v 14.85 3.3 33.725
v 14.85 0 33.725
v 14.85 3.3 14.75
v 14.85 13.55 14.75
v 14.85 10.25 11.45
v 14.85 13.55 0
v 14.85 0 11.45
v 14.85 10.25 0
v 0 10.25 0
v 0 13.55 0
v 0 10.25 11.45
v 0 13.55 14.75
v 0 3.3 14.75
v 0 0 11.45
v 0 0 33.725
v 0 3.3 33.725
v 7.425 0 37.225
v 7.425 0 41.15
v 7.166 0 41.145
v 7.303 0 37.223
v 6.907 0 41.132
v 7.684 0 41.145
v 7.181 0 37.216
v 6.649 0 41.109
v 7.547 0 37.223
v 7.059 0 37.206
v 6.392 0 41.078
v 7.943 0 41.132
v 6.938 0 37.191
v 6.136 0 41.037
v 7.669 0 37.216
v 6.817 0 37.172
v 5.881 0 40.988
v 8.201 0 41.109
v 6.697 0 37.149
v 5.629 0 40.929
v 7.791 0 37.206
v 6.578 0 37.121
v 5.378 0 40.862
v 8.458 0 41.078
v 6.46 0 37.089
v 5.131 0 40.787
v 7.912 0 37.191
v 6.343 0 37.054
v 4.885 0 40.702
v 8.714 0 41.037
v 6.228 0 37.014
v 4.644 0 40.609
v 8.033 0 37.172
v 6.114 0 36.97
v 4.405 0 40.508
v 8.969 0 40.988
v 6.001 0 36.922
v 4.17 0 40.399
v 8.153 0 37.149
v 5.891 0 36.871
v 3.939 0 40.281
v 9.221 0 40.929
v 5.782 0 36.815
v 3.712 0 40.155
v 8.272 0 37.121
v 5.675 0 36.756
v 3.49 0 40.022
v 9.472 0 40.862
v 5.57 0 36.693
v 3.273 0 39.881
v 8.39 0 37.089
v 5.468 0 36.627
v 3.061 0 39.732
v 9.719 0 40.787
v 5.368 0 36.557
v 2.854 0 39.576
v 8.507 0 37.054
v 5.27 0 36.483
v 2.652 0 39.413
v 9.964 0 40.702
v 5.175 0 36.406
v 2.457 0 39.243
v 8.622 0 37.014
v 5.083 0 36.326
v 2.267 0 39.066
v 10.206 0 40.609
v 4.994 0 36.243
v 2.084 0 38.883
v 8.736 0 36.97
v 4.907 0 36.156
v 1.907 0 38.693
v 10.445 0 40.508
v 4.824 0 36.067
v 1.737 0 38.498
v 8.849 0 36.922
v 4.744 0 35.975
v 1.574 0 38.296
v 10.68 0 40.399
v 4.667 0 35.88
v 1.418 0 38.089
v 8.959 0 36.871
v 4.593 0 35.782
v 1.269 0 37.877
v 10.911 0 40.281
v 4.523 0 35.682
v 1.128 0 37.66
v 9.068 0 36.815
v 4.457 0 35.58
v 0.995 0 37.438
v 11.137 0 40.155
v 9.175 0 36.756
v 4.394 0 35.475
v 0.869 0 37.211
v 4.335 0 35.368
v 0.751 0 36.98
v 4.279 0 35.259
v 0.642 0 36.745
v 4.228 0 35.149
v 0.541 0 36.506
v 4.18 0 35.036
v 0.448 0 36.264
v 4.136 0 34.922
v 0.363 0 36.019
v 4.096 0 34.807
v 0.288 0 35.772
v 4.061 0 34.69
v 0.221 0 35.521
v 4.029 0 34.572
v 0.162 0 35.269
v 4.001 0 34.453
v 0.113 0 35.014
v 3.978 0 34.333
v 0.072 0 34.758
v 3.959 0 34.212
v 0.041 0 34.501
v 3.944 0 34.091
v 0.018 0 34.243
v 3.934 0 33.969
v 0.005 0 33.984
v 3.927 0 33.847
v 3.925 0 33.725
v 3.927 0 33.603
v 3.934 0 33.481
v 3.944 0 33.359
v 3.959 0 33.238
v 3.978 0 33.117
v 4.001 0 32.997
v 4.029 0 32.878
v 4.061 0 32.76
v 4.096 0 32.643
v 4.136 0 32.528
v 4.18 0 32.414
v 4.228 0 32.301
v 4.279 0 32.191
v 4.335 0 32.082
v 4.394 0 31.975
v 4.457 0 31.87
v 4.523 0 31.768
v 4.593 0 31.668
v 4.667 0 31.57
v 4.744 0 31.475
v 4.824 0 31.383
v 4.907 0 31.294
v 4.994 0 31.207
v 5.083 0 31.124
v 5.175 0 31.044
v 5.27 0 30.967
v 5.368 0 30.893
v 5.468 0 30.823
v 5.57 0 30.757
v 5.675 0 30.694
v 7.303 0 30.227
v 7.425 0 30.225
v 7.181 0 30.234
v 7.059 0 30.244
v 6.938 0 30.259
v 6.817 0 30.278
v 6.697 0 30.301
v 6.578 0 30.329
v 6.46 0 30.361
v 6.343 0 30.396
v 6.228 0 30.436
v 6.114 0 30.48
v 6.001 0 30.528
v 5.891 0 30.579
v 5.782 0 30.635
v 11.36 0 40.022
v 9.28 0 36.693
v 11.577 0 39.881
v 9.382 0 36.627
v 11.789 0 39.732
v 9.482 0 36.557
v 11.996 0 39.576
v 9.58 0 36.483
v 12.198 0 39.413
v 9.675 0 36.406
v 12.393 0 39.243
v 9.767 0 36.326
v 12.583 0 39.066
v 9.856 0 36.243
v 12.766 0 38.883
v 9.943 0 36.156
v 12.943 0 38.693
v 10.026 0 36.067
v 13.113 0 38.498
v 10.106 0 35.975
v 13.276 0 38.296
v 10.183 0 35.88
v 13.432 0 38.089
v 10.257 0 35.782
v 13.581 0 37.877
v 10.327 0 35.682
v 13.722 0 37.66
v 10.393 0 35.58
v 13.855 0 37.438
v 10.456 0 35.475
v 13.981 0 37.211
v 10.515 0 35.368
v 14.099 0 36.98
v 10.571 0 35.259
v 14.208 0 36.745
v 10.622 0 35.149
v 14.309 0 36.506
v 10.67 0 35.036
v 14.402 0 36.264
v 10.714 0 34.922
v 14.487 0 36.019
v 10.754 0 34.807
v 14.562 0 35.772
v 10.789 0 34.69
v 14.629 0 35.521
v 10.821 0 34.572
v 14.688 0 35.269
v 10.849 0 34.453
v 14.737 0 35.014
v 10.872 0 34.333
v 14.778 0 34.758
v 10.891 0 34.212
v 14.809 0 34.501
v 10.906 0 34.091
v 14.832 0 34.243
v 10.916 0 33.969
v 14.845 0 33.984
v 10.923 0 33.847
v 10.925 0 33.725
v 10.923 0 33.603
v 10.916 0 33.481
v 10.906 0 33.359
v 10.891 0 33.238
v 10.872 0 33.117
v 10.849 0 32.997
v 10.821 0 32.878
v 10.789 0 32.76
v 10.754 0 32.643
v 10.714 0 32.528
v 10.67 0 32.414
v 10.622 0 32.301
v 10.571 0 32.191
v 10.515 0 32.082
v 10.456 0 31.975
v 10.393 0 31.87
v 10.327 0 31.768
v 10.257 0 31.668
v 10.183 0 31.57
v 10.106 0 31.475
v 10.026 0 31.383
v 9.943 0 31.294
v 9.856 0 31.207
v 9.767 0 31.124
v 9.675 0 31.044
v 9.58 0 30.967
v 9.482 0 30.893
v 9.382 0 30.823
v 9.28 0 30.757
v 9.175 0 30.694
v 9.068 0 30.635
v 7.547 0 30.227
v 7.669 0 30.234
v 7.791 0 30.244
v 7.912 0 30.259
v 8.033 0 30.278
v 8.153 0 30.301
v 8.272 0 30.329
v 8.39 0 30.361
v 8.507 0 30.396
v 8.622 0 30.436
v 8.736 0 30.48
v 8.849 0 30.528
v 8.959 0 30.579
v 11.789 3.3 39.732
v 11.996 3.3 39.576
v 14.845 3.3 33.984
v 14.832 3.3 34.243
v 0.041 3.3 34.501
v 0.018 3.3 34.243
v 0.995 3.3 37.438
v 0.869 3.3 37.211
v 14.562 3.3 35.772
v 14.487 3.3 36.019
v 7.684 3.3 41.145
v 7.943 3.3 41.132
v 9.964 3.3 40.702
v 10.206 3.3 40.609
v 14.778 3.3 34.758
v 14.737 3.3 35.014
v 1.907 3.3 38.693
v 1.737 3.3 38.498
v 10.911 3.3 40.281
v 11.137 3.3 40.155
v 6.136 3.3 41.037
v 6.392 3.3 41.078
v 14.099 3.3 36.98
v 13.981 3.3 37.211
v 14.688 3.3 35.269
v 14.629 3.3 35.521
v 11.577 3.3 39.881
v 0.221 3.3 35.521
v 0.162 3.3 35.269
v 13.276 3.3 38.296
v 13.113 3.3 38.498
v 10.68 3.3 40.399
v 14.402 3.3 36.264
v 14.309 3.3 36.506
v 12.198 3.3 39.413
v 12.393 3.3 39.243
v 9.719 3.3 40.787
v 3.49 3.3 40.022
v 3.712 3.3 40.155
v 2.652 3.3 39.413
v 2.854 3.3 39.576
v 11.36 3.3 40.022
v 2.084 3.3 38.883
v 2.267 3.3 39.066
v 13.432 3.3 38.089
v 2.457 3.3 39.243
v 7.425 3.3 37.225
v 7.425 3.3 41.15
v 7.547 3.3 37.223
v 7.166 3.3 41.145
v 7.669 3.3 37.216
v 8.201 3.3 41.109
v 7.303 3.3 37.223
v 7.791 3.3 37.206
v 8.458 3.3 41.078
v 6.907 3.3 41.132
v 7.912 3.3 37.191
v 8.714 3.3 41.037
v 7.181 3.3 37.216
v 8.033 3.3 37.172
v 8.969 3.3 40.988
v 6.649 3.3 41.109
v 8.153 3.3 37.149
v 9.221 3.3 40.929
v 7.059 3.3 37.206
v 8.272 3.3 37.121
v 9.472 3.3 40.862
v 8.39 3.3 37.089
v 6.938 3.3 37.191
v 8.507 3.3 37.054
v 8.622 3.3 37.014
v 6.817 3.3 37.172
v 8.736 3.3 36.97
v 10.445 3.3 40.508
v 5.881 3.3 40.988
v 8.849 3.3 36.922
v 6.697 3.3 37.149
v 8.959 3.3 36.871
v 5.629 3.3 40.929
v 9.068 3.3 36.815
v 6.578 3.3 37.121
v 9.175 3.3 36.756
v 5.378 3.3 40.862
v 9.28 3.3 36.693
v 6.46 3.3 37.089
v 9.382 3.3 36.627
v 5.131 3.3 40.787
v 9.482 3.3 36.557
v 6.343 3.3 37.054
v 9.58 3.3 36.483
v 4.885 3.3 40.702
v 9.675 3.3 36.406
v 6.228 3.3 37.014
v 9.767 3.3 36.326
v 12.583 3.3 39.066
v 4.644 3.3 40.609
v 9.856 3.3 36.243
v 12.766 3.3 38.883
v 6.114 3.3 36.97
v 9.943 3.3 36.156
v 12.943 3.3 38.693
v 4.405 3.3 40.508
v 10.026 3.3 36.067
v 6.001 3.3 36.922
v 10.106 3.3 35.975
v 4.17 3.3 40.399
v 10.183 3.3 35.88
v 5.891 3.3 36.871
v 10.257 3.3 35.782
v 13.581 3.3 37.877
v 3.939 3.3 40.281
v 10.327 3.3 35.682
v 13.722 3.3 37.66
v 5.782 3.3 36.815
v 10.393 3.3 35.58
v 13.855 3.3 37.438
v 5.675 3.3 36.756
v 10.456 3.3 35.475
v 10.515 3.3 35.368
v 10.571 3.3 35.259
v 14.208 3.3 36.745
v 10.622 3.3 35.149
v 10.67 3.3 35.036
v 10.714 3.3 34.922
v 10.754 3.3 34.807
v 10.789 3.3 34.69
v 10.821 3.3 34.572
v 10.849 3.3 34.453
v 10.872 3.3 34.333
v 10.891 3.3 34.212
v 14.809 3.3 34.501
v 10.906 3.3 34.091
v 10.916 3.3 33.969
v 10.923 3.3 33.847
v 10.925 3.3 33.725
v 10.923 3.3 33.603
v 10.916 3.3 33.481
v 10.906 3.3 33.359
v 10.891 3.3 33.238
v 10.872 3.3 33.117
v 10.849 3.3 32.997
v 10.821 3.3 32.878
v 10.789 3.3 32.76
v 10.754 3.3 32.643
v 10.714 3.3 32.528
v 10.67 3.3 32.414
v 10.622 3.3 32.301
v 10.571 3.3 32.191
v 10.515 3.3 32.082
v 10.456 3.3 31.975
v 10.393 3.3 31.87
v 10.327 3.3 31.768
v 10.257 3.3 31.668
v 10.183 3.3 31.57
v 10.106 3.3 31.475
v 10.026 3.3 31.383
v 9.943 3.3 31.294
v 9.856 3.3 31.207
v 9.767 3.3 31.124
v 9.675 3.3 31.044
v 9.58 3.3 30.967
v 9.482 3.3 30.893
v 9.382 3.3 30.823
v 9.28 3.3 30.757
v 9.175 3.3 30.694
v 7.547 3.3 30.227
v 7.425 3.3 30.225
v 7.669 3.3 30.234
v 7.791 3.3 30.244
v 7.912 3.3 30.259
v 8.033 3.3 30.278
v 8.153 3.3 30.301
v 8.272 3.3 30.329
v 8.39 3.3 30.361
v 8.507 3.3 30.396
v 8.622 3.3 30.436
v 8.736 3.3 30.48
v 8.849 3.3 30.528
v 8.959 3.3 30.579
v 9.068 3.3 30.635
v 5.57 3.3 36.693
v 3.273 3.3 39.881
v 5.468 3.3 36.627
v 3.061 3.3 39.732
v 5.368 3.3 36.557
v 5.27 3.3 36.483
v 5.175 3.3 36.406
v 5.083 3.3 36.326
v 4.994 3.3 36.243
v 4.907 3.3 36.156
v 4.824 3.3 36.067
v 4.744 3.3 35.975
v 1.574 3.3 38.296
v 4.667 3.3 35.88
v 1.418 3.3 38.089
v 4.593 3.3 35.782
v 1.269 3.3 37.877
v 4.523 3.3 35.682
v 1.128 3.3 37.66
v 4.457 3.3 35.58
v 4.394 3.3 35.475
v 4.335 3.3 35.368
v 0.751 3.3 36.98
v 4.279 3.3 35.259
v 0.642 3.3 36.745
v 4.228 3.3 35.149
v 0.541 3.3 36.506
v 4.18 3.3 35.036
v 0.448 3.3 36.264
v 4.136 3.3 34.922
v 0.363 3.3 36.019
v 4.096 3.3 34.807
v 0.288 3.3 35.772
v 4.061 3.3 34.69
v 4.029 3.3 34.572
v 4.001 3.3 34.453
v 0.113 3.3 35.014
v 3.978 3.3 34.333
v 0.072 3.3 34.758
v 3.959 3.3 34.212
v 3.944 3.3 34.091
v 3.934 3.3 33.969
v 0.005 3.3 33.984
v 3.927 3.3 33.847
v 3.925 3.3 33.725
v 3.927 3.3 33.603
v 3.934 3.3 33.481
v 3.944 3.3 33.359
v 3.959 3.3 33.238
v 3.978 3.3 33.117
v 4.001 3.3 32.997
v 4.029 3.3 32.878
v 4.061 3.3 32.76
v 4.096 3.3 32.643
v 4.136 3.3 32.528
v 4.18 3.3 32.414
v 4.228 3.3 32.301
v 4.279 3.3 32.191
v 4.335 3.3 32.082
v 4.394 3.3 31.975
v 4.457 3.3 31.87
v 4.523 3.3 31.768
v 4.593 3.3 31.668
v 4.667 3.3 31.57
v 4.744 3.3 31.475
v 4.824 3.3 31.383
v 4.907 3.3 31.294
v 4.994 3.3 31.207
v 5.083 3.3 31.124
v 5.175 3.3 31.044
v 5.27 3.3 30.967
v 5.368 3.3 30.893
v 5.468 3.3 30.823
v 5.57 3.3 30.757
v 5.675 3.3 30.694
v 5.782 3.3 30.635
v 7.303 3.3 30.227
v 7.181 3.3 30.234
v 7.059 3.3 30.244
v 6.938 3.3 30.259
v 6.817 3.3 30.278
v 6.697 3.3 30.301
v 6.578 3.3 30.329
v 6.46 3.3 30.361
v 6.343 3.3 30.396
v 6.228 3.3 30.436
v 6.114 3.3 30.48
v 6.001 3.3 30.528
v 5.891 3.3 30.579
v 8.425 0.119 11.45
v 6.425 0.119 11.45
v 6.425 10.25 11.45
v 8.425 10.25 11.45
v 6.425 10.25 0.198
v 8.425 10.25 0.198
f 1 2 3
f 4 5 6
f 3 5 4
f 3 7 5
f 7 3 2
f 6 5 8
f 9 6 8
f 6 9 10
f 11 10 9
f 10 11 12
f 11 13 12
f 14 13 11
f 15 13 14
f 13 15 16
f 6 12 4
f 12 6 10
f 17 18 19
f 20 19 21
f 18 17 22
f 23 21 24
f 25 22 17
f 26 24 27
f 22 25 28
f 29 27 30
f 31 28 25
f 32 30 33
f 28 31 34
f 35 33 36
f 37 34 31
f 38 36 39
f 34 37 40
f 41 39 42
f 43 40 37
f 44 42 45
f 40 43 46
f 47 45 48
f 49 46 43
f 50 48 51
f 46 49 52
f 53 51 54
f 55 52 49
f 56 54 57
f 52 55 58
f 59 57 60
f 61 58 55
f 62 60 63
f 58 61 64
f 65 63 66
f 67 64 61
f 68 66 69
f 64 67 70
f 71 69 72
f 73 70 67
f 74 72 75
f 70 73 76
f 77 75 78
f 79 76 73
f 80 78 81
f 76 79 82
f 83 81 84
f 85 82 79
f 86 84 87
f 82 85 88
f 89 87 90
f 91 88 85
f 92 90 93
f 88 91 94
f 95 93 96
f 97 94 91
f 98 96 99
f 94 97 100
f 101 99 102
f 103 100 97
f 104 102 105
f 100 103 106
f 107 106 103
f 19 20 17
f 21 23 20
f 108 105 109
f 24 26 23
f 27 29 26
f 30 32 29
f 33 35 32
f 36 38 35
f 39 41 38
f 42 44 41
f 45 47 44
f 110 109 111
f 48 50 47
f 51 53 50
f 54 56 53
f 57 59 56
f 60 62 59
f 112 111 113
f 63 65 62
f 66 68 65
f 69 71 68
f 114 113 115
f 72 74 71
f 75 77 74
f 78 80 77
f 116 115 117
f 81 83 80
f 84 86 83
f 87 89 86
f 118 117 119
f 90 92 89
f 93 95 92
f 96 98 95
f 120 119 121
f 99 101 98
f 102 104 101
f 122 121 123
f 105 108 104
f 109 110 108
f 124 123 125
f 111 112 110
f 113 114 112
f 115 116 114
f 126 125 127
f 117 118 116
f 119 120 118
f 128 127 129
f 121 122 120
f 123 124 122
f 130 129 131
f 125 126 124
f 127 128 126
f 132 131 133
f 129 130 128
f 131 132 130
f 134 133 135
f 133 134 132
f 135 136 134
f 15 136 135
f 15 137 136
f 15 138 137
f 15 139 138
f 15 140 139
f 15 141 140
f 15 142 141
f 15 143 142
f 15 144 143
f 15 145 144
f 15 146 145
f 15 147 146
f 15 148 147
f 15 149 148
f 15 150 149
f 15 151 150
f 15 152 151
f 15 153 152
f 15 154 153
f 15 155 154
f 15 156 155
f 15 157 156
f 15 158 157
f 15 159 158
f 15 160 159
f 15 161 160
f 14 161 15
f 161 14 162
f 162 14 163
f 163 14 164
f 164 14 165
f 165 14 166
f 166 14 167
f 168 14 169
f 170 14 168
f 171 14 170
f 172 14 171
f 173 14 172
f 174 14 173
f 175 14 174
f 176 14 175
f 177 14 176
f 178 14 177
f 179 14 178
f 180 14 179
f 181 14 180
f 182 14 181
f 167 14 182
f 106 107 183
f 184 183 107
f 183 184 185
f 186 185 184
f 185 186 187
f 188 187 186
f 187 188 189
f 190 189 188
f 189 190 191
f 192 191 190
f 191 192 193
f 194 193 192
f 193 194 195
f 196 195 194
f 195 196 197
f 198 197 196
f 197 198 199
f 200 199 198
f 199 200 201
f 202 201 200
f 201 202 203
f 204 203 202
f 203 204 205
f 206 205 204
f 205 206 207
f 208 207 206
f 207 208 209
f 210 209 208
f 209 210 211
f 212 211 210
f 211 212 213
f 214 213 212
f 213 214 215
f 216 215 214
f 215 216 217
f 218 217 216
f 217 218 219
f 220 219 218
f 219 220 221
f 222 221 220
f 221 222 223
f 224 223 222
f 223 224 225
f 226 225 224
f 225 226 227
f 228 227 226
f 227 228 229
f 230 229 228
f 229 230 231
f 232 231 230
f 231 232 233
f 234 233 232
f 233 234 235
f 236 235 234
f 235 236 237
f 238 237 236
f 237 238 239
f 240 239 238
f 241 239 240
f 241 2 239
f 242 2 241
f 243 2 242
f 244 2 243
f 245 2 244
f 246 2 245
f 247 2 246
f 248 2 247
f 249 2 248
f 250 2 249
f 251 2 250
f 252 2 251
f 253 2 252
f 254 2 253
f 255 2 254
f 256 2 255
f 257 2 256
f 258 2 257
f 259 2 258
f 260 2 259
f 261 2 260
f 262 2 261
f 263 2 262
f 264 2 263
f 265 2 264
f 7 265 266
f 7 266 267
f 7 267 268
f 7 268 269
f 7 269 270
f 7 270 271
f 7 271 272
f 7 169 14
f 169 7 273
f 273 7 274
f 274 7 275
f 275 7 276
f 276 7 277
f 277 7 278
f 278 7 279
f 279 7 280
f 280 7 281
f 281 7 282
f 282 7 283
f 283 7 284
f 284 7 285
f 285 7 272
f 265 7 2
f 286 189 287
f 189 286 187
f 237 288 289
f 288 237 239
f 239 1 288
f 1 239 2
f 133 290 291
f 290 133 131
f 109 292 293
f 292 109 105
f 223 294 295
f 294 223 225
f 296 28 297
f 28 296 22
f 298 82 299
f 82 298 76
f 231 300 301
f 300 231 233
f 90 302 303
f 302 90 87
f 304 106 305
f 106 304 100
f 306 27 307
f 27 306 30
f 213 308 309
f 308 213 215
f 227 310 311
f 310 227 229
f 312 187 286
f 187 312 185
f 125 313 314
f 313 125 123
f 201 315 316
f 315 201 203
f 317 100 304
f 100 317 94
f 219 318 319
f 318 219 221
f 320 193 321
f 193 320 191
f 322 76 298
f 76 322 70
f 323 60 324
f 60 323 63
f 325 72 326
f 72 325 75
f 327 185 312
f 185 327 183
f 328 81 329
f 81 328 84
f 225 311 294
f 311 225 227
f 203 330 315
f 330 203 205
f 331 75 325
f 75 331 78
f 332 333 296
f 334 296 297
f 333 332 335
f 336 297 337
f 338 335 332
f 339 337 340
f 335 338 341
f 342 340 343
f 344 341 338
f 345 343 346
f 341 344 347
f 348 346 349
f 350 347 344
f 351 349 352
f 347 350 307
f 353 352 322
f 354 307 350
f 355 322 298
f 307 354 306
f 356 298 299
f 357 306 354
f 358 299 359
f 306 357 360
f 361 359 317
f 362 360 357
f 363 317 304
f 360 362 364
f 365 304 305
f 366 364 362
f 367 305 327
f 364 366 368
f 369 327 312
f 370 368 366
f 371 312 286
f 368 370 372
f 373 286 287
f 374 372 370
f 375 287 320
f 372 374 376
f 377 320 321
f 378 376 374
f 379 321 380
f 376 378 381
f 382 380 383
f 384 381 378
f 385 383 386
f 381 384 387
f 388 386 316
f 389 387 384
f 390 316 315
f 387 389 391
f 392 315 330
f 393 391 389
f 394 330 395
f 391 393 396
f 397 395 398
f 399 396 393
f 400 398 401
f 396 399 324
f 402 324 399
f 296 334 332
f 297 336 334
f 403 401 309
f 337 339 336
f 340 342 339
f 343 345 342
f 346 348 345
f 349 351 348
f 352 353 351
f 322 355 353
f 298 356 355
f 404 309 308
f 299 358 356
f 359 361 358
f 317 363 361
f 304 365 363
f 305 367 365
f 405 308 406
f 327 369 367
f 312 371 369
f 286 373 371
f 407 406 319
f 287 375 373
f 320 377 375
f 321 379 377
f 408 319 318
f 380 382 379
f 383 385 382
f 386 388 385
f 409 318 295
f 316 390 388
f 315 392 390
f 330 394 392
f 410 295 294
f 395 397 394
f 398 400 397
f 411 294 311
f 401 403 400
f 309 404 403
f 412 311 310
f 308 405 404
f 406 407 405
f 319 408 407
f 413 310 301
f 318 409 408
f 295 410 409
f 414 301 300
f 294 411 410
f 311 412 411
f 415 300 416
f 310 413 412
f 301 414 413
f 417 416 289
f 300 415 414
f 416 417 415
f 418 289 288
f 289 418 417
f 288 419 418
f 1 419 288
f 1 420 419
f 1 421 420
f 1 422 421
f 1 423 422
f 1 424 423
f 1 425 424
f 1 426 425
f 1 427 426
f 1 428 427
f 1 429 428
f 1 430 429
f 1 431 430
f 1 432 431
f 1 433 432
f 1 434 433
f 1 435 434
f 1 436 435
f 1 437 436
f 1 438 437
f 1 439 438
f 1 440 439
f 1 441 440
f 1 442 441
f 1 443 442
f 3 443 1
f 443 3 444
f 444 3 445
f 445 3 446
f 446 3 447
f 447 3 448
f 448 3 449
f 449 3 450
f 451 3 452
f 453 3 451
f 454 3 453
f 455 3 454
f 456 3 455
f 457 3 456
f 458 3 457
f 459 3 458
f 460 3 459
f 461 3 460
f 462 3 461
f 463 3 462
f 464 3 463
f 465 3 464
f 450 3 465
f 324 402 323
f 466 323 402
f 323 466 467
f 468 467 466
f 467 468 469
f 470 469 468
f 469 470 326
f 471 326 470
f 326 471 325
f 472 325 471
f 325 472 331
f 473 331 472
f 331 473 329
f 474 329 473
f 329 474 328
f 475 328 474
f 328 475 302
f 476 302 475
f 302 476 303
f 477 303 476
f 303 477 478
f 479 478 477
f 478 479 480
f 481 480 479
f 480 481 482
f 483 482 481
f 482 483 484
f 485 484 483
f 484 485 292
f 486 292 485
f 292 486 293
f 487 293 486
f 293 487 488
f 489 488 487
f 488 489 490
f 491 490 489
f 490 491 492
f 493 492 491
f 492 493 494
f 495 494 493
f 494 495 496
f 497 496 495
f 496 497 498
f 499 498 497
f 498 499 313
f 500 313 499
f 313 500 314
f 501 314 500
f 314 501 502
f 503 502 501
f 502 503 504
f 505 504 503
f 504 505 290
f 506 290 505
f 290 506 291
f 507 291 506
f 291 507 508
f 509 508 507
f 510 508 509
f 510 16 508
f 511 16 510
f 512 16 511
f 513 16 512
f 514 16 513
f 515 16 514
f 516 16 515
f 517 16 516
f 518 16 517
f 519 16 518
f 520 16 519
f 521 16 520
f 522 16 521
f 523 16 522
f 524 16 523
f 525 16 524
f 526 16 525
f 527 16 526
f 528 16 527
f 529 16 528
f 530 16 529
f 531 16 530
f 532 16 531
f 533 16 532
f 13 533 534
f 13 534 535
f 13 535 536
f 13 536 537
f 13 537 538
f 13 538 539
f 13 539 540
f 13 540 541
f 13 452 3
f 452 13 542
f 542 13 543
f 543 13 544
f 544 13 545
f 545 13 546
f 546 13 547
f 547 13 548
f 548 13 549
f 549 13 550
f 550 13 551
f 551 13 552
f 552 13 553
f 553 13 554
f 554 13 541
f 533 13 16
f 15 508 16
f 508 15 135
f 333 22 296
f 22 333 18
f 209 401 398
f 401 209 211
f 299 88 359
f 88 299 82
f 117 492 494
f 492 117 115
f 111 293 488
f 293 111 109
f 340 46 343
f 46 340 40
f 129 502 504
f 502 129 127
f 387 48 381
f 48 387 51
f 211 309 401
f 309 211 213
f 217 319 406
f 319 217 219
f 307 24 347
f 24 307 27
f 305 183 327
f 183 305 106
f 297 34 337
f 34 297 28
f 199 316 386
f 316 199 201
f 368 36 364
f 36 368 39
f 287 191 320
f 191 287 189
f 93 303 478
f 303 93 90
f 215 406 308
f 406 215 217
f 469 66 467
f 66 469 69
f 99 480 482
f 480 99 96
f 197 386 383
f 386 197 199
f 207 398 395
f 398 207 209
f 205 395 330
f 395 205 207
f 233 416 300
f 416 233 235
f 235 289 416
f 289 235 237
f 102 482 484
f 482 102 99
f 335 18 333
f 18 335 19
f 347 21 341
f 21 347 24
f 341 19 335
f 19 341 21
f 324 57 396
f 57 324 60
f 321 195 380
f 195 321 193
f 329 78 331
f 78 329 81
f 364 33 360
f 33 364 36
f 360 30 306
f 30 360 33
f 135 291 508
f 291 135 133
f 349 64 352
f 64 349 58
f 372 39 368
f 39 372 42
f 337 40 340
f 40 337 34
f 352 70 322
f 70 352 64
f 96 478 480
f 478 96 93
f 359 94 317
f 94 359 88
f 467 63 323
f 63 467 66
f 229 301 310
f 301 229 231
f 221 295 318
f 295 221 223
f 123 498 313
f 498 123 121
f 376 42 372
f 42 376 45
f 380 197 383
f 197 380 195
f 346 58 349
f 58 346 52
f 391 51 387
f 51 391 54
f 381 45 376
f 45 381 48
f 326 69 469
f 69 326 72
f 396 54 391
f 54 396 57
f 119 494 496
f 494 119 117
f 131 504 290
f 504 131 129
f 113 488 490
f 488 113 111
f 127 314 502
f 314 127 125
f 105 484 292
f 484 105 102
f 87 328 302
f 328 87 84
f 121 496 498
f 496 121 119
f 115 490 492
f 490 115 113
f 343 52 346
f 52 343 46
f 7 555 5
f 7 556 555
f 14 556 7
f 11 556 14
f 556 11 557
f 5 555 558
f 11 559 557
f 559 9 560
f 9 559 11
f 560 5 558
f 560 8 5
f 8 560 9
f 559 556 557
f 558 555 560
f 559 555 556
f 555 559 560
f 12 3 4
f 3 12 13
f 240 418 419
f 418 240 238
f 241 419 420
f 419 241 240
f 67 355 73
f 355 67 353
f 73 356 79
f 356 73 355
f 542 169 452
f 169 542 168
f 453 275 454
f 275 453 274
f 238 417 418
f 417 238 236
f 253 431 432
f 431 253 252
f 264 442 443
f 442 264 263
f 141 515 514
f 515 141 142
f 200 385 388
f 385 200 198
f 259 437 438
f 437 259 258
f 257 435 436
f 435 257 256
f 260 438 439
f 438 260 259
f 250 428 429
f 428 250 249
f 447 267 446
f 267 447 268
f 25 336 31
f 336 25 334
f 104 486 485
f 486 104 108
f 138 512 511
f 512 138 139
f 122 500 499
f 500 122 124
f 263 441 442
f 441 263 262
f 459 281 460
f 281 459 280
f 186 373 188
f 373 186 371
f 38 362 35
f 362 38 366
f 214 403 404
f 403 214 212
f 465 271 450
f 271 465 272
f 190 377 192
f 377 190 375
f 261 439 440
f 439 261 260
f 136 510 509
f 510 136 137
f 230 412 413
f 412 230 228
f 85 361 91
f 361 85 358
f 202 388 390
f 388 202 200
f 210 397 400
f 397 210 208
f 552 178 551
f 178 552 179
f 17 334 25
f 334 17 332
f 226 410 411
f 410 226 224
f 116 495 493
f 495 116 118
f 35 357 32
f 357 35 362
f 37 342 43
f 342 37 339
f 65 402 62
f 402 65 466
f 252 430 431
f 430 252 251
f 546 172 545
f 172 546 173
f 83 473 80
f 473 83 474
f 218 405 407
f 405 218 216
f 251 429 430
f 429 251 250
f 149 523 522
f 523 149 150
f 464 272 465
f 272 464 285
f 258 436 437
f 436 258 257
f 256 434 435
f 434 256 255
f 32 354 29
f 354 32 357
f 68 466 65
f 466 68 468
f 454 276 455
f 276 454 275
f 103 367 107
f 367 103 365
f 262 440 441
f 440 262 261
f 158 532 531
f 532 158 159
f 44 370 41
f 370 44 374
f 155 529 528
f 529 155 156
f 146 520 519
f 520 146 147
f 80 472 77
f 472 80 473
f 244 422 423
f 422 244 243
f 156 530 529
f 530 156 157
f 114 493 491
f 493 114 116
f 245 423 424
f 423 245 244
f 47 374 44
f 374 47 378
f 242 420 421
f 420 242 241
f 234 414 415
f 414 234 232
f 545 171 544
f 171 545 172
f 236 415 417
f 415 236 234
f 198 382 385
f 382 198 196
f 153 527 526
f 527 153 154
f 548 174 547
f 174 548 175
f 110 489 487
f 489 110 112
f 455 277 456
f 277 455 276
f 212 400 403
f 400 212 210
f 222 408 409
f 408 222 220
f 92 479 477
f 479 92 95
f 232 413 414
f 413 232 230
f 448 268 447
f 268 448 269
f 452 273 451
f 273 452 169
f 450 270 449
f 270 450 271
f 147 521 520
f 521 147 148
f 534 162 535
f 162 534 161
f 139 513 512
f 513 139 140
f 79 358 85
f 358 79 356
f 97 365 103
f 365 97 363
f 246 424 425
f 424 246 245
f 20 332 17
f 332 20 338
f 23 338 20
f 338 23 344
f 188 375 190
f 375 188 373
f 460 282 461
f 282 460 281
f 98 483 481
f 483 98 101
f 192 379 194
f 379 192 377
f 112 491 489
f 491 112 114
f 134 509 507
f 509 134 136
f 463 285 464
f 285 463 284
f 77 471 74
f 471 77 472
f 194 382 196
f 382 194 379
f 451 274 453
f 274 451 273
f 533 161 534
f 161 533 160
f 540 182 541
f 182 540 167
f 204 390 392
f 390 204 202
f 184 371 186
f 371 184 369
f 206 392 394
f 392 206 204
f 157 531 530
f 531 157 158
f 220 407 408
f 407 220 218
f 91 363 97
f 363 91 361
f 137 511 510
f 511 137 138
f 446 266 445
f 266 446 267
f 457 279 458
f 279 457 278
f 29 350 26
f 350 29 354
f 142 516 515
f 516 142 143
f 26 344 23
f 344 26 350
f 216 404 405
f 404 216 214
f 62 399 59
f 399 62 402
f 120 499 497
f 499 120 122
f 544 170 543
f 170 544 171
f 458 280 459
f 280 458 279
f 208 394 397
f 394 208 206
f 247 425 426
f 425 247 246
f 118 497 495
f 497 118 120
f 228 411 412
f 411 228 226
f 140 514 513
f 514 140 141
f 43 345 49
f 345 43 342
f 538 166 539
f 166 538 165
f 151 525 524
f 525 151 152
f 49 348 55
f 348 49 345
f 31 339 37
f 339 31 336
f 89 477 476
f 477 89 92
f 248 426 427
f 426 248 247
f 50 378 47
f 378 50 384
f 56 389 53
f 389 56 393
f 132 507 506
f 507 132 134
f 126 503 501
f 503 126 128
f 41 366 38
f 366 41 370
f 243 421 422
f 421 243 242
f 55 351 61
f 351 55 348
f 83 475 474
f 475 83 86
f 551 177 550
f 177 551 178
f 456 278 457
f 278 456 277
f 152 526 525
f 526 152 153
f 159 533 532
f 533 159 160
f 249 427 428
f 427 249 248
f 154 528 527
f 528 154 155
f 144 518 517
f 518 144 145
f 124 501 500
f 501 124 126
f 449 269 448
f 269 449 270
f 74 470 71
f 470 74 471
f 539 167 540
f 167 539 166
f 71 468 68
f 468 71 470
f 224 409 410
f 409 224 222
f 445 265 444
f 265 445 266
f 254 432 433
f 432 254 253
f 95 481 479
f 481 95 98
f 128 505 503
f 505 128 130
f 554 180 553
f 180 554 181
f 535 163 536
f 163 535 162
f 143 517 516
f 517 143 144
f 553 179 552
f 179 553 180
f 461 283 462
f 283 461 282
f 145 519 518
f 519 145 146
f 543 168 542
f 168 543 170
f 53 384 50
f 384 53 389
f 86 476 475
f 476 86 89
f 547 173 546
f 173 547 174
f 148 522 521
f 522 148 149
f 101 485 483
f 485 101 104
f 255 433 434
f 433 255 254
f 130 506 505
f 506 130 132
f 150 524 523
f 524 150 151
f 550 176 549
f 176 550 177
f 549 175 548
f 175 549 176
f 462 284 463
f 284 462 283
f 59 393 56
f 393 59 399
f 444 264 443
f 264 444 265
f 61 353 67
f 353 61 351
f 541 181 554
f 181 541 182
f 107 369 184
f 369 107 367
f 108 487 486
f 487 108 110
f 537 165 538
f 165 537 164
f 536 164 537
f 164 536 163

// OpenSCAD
width=14.85;
length=41.15;
depth=13.55;
holeDiameter=7;
cylinerRadius=width/2;
tabThickness=3.3;
tabOffset=26.4;

difference() {
    tabBody();
    
    translate([width/2, depth, length-cylinerRadius])
    rotate([90, 0, 0])
    cylinder(h=depth, d=holeDiameter, $fn=180);
    
}

module tabBody() {   
    difference() {
        union() {
            difference() {
                union() {
                    cube([width, depth, length-cylinerRadius]);
                    
                    translate([width/2, tabThickness, length-cylinerRadius])
                    rotate([90, 0, 0])
                    cylinder(h=tabThickness, d=width, $fn=180);
                }
        
                // rear
                translate([0, -tabThickness, -tabOffset-tabThickness])
                cube([width, depth, length]);
            }
                        
            // rear fin        
            rearTabThickness=2;
            rotate([42, 0, 0])
            translate([width/2-rearTabThickness/2, 7.75, -14])
            cube([rearTabThickness, depth, tabOffset]);
        }
            
        // front
        translate([0, tabThickness, length-tabOffset])
        cube([width, depth, length]);
        
        // outside
        translate([0, depth, 0])
        cube([width, depth, length]);
        
        translate([0, -depth, 0])
        cube([width, depth, length]);
        
        translate([0, depth*.75, -length])
        cube([width, depth, length]);
    }
}
